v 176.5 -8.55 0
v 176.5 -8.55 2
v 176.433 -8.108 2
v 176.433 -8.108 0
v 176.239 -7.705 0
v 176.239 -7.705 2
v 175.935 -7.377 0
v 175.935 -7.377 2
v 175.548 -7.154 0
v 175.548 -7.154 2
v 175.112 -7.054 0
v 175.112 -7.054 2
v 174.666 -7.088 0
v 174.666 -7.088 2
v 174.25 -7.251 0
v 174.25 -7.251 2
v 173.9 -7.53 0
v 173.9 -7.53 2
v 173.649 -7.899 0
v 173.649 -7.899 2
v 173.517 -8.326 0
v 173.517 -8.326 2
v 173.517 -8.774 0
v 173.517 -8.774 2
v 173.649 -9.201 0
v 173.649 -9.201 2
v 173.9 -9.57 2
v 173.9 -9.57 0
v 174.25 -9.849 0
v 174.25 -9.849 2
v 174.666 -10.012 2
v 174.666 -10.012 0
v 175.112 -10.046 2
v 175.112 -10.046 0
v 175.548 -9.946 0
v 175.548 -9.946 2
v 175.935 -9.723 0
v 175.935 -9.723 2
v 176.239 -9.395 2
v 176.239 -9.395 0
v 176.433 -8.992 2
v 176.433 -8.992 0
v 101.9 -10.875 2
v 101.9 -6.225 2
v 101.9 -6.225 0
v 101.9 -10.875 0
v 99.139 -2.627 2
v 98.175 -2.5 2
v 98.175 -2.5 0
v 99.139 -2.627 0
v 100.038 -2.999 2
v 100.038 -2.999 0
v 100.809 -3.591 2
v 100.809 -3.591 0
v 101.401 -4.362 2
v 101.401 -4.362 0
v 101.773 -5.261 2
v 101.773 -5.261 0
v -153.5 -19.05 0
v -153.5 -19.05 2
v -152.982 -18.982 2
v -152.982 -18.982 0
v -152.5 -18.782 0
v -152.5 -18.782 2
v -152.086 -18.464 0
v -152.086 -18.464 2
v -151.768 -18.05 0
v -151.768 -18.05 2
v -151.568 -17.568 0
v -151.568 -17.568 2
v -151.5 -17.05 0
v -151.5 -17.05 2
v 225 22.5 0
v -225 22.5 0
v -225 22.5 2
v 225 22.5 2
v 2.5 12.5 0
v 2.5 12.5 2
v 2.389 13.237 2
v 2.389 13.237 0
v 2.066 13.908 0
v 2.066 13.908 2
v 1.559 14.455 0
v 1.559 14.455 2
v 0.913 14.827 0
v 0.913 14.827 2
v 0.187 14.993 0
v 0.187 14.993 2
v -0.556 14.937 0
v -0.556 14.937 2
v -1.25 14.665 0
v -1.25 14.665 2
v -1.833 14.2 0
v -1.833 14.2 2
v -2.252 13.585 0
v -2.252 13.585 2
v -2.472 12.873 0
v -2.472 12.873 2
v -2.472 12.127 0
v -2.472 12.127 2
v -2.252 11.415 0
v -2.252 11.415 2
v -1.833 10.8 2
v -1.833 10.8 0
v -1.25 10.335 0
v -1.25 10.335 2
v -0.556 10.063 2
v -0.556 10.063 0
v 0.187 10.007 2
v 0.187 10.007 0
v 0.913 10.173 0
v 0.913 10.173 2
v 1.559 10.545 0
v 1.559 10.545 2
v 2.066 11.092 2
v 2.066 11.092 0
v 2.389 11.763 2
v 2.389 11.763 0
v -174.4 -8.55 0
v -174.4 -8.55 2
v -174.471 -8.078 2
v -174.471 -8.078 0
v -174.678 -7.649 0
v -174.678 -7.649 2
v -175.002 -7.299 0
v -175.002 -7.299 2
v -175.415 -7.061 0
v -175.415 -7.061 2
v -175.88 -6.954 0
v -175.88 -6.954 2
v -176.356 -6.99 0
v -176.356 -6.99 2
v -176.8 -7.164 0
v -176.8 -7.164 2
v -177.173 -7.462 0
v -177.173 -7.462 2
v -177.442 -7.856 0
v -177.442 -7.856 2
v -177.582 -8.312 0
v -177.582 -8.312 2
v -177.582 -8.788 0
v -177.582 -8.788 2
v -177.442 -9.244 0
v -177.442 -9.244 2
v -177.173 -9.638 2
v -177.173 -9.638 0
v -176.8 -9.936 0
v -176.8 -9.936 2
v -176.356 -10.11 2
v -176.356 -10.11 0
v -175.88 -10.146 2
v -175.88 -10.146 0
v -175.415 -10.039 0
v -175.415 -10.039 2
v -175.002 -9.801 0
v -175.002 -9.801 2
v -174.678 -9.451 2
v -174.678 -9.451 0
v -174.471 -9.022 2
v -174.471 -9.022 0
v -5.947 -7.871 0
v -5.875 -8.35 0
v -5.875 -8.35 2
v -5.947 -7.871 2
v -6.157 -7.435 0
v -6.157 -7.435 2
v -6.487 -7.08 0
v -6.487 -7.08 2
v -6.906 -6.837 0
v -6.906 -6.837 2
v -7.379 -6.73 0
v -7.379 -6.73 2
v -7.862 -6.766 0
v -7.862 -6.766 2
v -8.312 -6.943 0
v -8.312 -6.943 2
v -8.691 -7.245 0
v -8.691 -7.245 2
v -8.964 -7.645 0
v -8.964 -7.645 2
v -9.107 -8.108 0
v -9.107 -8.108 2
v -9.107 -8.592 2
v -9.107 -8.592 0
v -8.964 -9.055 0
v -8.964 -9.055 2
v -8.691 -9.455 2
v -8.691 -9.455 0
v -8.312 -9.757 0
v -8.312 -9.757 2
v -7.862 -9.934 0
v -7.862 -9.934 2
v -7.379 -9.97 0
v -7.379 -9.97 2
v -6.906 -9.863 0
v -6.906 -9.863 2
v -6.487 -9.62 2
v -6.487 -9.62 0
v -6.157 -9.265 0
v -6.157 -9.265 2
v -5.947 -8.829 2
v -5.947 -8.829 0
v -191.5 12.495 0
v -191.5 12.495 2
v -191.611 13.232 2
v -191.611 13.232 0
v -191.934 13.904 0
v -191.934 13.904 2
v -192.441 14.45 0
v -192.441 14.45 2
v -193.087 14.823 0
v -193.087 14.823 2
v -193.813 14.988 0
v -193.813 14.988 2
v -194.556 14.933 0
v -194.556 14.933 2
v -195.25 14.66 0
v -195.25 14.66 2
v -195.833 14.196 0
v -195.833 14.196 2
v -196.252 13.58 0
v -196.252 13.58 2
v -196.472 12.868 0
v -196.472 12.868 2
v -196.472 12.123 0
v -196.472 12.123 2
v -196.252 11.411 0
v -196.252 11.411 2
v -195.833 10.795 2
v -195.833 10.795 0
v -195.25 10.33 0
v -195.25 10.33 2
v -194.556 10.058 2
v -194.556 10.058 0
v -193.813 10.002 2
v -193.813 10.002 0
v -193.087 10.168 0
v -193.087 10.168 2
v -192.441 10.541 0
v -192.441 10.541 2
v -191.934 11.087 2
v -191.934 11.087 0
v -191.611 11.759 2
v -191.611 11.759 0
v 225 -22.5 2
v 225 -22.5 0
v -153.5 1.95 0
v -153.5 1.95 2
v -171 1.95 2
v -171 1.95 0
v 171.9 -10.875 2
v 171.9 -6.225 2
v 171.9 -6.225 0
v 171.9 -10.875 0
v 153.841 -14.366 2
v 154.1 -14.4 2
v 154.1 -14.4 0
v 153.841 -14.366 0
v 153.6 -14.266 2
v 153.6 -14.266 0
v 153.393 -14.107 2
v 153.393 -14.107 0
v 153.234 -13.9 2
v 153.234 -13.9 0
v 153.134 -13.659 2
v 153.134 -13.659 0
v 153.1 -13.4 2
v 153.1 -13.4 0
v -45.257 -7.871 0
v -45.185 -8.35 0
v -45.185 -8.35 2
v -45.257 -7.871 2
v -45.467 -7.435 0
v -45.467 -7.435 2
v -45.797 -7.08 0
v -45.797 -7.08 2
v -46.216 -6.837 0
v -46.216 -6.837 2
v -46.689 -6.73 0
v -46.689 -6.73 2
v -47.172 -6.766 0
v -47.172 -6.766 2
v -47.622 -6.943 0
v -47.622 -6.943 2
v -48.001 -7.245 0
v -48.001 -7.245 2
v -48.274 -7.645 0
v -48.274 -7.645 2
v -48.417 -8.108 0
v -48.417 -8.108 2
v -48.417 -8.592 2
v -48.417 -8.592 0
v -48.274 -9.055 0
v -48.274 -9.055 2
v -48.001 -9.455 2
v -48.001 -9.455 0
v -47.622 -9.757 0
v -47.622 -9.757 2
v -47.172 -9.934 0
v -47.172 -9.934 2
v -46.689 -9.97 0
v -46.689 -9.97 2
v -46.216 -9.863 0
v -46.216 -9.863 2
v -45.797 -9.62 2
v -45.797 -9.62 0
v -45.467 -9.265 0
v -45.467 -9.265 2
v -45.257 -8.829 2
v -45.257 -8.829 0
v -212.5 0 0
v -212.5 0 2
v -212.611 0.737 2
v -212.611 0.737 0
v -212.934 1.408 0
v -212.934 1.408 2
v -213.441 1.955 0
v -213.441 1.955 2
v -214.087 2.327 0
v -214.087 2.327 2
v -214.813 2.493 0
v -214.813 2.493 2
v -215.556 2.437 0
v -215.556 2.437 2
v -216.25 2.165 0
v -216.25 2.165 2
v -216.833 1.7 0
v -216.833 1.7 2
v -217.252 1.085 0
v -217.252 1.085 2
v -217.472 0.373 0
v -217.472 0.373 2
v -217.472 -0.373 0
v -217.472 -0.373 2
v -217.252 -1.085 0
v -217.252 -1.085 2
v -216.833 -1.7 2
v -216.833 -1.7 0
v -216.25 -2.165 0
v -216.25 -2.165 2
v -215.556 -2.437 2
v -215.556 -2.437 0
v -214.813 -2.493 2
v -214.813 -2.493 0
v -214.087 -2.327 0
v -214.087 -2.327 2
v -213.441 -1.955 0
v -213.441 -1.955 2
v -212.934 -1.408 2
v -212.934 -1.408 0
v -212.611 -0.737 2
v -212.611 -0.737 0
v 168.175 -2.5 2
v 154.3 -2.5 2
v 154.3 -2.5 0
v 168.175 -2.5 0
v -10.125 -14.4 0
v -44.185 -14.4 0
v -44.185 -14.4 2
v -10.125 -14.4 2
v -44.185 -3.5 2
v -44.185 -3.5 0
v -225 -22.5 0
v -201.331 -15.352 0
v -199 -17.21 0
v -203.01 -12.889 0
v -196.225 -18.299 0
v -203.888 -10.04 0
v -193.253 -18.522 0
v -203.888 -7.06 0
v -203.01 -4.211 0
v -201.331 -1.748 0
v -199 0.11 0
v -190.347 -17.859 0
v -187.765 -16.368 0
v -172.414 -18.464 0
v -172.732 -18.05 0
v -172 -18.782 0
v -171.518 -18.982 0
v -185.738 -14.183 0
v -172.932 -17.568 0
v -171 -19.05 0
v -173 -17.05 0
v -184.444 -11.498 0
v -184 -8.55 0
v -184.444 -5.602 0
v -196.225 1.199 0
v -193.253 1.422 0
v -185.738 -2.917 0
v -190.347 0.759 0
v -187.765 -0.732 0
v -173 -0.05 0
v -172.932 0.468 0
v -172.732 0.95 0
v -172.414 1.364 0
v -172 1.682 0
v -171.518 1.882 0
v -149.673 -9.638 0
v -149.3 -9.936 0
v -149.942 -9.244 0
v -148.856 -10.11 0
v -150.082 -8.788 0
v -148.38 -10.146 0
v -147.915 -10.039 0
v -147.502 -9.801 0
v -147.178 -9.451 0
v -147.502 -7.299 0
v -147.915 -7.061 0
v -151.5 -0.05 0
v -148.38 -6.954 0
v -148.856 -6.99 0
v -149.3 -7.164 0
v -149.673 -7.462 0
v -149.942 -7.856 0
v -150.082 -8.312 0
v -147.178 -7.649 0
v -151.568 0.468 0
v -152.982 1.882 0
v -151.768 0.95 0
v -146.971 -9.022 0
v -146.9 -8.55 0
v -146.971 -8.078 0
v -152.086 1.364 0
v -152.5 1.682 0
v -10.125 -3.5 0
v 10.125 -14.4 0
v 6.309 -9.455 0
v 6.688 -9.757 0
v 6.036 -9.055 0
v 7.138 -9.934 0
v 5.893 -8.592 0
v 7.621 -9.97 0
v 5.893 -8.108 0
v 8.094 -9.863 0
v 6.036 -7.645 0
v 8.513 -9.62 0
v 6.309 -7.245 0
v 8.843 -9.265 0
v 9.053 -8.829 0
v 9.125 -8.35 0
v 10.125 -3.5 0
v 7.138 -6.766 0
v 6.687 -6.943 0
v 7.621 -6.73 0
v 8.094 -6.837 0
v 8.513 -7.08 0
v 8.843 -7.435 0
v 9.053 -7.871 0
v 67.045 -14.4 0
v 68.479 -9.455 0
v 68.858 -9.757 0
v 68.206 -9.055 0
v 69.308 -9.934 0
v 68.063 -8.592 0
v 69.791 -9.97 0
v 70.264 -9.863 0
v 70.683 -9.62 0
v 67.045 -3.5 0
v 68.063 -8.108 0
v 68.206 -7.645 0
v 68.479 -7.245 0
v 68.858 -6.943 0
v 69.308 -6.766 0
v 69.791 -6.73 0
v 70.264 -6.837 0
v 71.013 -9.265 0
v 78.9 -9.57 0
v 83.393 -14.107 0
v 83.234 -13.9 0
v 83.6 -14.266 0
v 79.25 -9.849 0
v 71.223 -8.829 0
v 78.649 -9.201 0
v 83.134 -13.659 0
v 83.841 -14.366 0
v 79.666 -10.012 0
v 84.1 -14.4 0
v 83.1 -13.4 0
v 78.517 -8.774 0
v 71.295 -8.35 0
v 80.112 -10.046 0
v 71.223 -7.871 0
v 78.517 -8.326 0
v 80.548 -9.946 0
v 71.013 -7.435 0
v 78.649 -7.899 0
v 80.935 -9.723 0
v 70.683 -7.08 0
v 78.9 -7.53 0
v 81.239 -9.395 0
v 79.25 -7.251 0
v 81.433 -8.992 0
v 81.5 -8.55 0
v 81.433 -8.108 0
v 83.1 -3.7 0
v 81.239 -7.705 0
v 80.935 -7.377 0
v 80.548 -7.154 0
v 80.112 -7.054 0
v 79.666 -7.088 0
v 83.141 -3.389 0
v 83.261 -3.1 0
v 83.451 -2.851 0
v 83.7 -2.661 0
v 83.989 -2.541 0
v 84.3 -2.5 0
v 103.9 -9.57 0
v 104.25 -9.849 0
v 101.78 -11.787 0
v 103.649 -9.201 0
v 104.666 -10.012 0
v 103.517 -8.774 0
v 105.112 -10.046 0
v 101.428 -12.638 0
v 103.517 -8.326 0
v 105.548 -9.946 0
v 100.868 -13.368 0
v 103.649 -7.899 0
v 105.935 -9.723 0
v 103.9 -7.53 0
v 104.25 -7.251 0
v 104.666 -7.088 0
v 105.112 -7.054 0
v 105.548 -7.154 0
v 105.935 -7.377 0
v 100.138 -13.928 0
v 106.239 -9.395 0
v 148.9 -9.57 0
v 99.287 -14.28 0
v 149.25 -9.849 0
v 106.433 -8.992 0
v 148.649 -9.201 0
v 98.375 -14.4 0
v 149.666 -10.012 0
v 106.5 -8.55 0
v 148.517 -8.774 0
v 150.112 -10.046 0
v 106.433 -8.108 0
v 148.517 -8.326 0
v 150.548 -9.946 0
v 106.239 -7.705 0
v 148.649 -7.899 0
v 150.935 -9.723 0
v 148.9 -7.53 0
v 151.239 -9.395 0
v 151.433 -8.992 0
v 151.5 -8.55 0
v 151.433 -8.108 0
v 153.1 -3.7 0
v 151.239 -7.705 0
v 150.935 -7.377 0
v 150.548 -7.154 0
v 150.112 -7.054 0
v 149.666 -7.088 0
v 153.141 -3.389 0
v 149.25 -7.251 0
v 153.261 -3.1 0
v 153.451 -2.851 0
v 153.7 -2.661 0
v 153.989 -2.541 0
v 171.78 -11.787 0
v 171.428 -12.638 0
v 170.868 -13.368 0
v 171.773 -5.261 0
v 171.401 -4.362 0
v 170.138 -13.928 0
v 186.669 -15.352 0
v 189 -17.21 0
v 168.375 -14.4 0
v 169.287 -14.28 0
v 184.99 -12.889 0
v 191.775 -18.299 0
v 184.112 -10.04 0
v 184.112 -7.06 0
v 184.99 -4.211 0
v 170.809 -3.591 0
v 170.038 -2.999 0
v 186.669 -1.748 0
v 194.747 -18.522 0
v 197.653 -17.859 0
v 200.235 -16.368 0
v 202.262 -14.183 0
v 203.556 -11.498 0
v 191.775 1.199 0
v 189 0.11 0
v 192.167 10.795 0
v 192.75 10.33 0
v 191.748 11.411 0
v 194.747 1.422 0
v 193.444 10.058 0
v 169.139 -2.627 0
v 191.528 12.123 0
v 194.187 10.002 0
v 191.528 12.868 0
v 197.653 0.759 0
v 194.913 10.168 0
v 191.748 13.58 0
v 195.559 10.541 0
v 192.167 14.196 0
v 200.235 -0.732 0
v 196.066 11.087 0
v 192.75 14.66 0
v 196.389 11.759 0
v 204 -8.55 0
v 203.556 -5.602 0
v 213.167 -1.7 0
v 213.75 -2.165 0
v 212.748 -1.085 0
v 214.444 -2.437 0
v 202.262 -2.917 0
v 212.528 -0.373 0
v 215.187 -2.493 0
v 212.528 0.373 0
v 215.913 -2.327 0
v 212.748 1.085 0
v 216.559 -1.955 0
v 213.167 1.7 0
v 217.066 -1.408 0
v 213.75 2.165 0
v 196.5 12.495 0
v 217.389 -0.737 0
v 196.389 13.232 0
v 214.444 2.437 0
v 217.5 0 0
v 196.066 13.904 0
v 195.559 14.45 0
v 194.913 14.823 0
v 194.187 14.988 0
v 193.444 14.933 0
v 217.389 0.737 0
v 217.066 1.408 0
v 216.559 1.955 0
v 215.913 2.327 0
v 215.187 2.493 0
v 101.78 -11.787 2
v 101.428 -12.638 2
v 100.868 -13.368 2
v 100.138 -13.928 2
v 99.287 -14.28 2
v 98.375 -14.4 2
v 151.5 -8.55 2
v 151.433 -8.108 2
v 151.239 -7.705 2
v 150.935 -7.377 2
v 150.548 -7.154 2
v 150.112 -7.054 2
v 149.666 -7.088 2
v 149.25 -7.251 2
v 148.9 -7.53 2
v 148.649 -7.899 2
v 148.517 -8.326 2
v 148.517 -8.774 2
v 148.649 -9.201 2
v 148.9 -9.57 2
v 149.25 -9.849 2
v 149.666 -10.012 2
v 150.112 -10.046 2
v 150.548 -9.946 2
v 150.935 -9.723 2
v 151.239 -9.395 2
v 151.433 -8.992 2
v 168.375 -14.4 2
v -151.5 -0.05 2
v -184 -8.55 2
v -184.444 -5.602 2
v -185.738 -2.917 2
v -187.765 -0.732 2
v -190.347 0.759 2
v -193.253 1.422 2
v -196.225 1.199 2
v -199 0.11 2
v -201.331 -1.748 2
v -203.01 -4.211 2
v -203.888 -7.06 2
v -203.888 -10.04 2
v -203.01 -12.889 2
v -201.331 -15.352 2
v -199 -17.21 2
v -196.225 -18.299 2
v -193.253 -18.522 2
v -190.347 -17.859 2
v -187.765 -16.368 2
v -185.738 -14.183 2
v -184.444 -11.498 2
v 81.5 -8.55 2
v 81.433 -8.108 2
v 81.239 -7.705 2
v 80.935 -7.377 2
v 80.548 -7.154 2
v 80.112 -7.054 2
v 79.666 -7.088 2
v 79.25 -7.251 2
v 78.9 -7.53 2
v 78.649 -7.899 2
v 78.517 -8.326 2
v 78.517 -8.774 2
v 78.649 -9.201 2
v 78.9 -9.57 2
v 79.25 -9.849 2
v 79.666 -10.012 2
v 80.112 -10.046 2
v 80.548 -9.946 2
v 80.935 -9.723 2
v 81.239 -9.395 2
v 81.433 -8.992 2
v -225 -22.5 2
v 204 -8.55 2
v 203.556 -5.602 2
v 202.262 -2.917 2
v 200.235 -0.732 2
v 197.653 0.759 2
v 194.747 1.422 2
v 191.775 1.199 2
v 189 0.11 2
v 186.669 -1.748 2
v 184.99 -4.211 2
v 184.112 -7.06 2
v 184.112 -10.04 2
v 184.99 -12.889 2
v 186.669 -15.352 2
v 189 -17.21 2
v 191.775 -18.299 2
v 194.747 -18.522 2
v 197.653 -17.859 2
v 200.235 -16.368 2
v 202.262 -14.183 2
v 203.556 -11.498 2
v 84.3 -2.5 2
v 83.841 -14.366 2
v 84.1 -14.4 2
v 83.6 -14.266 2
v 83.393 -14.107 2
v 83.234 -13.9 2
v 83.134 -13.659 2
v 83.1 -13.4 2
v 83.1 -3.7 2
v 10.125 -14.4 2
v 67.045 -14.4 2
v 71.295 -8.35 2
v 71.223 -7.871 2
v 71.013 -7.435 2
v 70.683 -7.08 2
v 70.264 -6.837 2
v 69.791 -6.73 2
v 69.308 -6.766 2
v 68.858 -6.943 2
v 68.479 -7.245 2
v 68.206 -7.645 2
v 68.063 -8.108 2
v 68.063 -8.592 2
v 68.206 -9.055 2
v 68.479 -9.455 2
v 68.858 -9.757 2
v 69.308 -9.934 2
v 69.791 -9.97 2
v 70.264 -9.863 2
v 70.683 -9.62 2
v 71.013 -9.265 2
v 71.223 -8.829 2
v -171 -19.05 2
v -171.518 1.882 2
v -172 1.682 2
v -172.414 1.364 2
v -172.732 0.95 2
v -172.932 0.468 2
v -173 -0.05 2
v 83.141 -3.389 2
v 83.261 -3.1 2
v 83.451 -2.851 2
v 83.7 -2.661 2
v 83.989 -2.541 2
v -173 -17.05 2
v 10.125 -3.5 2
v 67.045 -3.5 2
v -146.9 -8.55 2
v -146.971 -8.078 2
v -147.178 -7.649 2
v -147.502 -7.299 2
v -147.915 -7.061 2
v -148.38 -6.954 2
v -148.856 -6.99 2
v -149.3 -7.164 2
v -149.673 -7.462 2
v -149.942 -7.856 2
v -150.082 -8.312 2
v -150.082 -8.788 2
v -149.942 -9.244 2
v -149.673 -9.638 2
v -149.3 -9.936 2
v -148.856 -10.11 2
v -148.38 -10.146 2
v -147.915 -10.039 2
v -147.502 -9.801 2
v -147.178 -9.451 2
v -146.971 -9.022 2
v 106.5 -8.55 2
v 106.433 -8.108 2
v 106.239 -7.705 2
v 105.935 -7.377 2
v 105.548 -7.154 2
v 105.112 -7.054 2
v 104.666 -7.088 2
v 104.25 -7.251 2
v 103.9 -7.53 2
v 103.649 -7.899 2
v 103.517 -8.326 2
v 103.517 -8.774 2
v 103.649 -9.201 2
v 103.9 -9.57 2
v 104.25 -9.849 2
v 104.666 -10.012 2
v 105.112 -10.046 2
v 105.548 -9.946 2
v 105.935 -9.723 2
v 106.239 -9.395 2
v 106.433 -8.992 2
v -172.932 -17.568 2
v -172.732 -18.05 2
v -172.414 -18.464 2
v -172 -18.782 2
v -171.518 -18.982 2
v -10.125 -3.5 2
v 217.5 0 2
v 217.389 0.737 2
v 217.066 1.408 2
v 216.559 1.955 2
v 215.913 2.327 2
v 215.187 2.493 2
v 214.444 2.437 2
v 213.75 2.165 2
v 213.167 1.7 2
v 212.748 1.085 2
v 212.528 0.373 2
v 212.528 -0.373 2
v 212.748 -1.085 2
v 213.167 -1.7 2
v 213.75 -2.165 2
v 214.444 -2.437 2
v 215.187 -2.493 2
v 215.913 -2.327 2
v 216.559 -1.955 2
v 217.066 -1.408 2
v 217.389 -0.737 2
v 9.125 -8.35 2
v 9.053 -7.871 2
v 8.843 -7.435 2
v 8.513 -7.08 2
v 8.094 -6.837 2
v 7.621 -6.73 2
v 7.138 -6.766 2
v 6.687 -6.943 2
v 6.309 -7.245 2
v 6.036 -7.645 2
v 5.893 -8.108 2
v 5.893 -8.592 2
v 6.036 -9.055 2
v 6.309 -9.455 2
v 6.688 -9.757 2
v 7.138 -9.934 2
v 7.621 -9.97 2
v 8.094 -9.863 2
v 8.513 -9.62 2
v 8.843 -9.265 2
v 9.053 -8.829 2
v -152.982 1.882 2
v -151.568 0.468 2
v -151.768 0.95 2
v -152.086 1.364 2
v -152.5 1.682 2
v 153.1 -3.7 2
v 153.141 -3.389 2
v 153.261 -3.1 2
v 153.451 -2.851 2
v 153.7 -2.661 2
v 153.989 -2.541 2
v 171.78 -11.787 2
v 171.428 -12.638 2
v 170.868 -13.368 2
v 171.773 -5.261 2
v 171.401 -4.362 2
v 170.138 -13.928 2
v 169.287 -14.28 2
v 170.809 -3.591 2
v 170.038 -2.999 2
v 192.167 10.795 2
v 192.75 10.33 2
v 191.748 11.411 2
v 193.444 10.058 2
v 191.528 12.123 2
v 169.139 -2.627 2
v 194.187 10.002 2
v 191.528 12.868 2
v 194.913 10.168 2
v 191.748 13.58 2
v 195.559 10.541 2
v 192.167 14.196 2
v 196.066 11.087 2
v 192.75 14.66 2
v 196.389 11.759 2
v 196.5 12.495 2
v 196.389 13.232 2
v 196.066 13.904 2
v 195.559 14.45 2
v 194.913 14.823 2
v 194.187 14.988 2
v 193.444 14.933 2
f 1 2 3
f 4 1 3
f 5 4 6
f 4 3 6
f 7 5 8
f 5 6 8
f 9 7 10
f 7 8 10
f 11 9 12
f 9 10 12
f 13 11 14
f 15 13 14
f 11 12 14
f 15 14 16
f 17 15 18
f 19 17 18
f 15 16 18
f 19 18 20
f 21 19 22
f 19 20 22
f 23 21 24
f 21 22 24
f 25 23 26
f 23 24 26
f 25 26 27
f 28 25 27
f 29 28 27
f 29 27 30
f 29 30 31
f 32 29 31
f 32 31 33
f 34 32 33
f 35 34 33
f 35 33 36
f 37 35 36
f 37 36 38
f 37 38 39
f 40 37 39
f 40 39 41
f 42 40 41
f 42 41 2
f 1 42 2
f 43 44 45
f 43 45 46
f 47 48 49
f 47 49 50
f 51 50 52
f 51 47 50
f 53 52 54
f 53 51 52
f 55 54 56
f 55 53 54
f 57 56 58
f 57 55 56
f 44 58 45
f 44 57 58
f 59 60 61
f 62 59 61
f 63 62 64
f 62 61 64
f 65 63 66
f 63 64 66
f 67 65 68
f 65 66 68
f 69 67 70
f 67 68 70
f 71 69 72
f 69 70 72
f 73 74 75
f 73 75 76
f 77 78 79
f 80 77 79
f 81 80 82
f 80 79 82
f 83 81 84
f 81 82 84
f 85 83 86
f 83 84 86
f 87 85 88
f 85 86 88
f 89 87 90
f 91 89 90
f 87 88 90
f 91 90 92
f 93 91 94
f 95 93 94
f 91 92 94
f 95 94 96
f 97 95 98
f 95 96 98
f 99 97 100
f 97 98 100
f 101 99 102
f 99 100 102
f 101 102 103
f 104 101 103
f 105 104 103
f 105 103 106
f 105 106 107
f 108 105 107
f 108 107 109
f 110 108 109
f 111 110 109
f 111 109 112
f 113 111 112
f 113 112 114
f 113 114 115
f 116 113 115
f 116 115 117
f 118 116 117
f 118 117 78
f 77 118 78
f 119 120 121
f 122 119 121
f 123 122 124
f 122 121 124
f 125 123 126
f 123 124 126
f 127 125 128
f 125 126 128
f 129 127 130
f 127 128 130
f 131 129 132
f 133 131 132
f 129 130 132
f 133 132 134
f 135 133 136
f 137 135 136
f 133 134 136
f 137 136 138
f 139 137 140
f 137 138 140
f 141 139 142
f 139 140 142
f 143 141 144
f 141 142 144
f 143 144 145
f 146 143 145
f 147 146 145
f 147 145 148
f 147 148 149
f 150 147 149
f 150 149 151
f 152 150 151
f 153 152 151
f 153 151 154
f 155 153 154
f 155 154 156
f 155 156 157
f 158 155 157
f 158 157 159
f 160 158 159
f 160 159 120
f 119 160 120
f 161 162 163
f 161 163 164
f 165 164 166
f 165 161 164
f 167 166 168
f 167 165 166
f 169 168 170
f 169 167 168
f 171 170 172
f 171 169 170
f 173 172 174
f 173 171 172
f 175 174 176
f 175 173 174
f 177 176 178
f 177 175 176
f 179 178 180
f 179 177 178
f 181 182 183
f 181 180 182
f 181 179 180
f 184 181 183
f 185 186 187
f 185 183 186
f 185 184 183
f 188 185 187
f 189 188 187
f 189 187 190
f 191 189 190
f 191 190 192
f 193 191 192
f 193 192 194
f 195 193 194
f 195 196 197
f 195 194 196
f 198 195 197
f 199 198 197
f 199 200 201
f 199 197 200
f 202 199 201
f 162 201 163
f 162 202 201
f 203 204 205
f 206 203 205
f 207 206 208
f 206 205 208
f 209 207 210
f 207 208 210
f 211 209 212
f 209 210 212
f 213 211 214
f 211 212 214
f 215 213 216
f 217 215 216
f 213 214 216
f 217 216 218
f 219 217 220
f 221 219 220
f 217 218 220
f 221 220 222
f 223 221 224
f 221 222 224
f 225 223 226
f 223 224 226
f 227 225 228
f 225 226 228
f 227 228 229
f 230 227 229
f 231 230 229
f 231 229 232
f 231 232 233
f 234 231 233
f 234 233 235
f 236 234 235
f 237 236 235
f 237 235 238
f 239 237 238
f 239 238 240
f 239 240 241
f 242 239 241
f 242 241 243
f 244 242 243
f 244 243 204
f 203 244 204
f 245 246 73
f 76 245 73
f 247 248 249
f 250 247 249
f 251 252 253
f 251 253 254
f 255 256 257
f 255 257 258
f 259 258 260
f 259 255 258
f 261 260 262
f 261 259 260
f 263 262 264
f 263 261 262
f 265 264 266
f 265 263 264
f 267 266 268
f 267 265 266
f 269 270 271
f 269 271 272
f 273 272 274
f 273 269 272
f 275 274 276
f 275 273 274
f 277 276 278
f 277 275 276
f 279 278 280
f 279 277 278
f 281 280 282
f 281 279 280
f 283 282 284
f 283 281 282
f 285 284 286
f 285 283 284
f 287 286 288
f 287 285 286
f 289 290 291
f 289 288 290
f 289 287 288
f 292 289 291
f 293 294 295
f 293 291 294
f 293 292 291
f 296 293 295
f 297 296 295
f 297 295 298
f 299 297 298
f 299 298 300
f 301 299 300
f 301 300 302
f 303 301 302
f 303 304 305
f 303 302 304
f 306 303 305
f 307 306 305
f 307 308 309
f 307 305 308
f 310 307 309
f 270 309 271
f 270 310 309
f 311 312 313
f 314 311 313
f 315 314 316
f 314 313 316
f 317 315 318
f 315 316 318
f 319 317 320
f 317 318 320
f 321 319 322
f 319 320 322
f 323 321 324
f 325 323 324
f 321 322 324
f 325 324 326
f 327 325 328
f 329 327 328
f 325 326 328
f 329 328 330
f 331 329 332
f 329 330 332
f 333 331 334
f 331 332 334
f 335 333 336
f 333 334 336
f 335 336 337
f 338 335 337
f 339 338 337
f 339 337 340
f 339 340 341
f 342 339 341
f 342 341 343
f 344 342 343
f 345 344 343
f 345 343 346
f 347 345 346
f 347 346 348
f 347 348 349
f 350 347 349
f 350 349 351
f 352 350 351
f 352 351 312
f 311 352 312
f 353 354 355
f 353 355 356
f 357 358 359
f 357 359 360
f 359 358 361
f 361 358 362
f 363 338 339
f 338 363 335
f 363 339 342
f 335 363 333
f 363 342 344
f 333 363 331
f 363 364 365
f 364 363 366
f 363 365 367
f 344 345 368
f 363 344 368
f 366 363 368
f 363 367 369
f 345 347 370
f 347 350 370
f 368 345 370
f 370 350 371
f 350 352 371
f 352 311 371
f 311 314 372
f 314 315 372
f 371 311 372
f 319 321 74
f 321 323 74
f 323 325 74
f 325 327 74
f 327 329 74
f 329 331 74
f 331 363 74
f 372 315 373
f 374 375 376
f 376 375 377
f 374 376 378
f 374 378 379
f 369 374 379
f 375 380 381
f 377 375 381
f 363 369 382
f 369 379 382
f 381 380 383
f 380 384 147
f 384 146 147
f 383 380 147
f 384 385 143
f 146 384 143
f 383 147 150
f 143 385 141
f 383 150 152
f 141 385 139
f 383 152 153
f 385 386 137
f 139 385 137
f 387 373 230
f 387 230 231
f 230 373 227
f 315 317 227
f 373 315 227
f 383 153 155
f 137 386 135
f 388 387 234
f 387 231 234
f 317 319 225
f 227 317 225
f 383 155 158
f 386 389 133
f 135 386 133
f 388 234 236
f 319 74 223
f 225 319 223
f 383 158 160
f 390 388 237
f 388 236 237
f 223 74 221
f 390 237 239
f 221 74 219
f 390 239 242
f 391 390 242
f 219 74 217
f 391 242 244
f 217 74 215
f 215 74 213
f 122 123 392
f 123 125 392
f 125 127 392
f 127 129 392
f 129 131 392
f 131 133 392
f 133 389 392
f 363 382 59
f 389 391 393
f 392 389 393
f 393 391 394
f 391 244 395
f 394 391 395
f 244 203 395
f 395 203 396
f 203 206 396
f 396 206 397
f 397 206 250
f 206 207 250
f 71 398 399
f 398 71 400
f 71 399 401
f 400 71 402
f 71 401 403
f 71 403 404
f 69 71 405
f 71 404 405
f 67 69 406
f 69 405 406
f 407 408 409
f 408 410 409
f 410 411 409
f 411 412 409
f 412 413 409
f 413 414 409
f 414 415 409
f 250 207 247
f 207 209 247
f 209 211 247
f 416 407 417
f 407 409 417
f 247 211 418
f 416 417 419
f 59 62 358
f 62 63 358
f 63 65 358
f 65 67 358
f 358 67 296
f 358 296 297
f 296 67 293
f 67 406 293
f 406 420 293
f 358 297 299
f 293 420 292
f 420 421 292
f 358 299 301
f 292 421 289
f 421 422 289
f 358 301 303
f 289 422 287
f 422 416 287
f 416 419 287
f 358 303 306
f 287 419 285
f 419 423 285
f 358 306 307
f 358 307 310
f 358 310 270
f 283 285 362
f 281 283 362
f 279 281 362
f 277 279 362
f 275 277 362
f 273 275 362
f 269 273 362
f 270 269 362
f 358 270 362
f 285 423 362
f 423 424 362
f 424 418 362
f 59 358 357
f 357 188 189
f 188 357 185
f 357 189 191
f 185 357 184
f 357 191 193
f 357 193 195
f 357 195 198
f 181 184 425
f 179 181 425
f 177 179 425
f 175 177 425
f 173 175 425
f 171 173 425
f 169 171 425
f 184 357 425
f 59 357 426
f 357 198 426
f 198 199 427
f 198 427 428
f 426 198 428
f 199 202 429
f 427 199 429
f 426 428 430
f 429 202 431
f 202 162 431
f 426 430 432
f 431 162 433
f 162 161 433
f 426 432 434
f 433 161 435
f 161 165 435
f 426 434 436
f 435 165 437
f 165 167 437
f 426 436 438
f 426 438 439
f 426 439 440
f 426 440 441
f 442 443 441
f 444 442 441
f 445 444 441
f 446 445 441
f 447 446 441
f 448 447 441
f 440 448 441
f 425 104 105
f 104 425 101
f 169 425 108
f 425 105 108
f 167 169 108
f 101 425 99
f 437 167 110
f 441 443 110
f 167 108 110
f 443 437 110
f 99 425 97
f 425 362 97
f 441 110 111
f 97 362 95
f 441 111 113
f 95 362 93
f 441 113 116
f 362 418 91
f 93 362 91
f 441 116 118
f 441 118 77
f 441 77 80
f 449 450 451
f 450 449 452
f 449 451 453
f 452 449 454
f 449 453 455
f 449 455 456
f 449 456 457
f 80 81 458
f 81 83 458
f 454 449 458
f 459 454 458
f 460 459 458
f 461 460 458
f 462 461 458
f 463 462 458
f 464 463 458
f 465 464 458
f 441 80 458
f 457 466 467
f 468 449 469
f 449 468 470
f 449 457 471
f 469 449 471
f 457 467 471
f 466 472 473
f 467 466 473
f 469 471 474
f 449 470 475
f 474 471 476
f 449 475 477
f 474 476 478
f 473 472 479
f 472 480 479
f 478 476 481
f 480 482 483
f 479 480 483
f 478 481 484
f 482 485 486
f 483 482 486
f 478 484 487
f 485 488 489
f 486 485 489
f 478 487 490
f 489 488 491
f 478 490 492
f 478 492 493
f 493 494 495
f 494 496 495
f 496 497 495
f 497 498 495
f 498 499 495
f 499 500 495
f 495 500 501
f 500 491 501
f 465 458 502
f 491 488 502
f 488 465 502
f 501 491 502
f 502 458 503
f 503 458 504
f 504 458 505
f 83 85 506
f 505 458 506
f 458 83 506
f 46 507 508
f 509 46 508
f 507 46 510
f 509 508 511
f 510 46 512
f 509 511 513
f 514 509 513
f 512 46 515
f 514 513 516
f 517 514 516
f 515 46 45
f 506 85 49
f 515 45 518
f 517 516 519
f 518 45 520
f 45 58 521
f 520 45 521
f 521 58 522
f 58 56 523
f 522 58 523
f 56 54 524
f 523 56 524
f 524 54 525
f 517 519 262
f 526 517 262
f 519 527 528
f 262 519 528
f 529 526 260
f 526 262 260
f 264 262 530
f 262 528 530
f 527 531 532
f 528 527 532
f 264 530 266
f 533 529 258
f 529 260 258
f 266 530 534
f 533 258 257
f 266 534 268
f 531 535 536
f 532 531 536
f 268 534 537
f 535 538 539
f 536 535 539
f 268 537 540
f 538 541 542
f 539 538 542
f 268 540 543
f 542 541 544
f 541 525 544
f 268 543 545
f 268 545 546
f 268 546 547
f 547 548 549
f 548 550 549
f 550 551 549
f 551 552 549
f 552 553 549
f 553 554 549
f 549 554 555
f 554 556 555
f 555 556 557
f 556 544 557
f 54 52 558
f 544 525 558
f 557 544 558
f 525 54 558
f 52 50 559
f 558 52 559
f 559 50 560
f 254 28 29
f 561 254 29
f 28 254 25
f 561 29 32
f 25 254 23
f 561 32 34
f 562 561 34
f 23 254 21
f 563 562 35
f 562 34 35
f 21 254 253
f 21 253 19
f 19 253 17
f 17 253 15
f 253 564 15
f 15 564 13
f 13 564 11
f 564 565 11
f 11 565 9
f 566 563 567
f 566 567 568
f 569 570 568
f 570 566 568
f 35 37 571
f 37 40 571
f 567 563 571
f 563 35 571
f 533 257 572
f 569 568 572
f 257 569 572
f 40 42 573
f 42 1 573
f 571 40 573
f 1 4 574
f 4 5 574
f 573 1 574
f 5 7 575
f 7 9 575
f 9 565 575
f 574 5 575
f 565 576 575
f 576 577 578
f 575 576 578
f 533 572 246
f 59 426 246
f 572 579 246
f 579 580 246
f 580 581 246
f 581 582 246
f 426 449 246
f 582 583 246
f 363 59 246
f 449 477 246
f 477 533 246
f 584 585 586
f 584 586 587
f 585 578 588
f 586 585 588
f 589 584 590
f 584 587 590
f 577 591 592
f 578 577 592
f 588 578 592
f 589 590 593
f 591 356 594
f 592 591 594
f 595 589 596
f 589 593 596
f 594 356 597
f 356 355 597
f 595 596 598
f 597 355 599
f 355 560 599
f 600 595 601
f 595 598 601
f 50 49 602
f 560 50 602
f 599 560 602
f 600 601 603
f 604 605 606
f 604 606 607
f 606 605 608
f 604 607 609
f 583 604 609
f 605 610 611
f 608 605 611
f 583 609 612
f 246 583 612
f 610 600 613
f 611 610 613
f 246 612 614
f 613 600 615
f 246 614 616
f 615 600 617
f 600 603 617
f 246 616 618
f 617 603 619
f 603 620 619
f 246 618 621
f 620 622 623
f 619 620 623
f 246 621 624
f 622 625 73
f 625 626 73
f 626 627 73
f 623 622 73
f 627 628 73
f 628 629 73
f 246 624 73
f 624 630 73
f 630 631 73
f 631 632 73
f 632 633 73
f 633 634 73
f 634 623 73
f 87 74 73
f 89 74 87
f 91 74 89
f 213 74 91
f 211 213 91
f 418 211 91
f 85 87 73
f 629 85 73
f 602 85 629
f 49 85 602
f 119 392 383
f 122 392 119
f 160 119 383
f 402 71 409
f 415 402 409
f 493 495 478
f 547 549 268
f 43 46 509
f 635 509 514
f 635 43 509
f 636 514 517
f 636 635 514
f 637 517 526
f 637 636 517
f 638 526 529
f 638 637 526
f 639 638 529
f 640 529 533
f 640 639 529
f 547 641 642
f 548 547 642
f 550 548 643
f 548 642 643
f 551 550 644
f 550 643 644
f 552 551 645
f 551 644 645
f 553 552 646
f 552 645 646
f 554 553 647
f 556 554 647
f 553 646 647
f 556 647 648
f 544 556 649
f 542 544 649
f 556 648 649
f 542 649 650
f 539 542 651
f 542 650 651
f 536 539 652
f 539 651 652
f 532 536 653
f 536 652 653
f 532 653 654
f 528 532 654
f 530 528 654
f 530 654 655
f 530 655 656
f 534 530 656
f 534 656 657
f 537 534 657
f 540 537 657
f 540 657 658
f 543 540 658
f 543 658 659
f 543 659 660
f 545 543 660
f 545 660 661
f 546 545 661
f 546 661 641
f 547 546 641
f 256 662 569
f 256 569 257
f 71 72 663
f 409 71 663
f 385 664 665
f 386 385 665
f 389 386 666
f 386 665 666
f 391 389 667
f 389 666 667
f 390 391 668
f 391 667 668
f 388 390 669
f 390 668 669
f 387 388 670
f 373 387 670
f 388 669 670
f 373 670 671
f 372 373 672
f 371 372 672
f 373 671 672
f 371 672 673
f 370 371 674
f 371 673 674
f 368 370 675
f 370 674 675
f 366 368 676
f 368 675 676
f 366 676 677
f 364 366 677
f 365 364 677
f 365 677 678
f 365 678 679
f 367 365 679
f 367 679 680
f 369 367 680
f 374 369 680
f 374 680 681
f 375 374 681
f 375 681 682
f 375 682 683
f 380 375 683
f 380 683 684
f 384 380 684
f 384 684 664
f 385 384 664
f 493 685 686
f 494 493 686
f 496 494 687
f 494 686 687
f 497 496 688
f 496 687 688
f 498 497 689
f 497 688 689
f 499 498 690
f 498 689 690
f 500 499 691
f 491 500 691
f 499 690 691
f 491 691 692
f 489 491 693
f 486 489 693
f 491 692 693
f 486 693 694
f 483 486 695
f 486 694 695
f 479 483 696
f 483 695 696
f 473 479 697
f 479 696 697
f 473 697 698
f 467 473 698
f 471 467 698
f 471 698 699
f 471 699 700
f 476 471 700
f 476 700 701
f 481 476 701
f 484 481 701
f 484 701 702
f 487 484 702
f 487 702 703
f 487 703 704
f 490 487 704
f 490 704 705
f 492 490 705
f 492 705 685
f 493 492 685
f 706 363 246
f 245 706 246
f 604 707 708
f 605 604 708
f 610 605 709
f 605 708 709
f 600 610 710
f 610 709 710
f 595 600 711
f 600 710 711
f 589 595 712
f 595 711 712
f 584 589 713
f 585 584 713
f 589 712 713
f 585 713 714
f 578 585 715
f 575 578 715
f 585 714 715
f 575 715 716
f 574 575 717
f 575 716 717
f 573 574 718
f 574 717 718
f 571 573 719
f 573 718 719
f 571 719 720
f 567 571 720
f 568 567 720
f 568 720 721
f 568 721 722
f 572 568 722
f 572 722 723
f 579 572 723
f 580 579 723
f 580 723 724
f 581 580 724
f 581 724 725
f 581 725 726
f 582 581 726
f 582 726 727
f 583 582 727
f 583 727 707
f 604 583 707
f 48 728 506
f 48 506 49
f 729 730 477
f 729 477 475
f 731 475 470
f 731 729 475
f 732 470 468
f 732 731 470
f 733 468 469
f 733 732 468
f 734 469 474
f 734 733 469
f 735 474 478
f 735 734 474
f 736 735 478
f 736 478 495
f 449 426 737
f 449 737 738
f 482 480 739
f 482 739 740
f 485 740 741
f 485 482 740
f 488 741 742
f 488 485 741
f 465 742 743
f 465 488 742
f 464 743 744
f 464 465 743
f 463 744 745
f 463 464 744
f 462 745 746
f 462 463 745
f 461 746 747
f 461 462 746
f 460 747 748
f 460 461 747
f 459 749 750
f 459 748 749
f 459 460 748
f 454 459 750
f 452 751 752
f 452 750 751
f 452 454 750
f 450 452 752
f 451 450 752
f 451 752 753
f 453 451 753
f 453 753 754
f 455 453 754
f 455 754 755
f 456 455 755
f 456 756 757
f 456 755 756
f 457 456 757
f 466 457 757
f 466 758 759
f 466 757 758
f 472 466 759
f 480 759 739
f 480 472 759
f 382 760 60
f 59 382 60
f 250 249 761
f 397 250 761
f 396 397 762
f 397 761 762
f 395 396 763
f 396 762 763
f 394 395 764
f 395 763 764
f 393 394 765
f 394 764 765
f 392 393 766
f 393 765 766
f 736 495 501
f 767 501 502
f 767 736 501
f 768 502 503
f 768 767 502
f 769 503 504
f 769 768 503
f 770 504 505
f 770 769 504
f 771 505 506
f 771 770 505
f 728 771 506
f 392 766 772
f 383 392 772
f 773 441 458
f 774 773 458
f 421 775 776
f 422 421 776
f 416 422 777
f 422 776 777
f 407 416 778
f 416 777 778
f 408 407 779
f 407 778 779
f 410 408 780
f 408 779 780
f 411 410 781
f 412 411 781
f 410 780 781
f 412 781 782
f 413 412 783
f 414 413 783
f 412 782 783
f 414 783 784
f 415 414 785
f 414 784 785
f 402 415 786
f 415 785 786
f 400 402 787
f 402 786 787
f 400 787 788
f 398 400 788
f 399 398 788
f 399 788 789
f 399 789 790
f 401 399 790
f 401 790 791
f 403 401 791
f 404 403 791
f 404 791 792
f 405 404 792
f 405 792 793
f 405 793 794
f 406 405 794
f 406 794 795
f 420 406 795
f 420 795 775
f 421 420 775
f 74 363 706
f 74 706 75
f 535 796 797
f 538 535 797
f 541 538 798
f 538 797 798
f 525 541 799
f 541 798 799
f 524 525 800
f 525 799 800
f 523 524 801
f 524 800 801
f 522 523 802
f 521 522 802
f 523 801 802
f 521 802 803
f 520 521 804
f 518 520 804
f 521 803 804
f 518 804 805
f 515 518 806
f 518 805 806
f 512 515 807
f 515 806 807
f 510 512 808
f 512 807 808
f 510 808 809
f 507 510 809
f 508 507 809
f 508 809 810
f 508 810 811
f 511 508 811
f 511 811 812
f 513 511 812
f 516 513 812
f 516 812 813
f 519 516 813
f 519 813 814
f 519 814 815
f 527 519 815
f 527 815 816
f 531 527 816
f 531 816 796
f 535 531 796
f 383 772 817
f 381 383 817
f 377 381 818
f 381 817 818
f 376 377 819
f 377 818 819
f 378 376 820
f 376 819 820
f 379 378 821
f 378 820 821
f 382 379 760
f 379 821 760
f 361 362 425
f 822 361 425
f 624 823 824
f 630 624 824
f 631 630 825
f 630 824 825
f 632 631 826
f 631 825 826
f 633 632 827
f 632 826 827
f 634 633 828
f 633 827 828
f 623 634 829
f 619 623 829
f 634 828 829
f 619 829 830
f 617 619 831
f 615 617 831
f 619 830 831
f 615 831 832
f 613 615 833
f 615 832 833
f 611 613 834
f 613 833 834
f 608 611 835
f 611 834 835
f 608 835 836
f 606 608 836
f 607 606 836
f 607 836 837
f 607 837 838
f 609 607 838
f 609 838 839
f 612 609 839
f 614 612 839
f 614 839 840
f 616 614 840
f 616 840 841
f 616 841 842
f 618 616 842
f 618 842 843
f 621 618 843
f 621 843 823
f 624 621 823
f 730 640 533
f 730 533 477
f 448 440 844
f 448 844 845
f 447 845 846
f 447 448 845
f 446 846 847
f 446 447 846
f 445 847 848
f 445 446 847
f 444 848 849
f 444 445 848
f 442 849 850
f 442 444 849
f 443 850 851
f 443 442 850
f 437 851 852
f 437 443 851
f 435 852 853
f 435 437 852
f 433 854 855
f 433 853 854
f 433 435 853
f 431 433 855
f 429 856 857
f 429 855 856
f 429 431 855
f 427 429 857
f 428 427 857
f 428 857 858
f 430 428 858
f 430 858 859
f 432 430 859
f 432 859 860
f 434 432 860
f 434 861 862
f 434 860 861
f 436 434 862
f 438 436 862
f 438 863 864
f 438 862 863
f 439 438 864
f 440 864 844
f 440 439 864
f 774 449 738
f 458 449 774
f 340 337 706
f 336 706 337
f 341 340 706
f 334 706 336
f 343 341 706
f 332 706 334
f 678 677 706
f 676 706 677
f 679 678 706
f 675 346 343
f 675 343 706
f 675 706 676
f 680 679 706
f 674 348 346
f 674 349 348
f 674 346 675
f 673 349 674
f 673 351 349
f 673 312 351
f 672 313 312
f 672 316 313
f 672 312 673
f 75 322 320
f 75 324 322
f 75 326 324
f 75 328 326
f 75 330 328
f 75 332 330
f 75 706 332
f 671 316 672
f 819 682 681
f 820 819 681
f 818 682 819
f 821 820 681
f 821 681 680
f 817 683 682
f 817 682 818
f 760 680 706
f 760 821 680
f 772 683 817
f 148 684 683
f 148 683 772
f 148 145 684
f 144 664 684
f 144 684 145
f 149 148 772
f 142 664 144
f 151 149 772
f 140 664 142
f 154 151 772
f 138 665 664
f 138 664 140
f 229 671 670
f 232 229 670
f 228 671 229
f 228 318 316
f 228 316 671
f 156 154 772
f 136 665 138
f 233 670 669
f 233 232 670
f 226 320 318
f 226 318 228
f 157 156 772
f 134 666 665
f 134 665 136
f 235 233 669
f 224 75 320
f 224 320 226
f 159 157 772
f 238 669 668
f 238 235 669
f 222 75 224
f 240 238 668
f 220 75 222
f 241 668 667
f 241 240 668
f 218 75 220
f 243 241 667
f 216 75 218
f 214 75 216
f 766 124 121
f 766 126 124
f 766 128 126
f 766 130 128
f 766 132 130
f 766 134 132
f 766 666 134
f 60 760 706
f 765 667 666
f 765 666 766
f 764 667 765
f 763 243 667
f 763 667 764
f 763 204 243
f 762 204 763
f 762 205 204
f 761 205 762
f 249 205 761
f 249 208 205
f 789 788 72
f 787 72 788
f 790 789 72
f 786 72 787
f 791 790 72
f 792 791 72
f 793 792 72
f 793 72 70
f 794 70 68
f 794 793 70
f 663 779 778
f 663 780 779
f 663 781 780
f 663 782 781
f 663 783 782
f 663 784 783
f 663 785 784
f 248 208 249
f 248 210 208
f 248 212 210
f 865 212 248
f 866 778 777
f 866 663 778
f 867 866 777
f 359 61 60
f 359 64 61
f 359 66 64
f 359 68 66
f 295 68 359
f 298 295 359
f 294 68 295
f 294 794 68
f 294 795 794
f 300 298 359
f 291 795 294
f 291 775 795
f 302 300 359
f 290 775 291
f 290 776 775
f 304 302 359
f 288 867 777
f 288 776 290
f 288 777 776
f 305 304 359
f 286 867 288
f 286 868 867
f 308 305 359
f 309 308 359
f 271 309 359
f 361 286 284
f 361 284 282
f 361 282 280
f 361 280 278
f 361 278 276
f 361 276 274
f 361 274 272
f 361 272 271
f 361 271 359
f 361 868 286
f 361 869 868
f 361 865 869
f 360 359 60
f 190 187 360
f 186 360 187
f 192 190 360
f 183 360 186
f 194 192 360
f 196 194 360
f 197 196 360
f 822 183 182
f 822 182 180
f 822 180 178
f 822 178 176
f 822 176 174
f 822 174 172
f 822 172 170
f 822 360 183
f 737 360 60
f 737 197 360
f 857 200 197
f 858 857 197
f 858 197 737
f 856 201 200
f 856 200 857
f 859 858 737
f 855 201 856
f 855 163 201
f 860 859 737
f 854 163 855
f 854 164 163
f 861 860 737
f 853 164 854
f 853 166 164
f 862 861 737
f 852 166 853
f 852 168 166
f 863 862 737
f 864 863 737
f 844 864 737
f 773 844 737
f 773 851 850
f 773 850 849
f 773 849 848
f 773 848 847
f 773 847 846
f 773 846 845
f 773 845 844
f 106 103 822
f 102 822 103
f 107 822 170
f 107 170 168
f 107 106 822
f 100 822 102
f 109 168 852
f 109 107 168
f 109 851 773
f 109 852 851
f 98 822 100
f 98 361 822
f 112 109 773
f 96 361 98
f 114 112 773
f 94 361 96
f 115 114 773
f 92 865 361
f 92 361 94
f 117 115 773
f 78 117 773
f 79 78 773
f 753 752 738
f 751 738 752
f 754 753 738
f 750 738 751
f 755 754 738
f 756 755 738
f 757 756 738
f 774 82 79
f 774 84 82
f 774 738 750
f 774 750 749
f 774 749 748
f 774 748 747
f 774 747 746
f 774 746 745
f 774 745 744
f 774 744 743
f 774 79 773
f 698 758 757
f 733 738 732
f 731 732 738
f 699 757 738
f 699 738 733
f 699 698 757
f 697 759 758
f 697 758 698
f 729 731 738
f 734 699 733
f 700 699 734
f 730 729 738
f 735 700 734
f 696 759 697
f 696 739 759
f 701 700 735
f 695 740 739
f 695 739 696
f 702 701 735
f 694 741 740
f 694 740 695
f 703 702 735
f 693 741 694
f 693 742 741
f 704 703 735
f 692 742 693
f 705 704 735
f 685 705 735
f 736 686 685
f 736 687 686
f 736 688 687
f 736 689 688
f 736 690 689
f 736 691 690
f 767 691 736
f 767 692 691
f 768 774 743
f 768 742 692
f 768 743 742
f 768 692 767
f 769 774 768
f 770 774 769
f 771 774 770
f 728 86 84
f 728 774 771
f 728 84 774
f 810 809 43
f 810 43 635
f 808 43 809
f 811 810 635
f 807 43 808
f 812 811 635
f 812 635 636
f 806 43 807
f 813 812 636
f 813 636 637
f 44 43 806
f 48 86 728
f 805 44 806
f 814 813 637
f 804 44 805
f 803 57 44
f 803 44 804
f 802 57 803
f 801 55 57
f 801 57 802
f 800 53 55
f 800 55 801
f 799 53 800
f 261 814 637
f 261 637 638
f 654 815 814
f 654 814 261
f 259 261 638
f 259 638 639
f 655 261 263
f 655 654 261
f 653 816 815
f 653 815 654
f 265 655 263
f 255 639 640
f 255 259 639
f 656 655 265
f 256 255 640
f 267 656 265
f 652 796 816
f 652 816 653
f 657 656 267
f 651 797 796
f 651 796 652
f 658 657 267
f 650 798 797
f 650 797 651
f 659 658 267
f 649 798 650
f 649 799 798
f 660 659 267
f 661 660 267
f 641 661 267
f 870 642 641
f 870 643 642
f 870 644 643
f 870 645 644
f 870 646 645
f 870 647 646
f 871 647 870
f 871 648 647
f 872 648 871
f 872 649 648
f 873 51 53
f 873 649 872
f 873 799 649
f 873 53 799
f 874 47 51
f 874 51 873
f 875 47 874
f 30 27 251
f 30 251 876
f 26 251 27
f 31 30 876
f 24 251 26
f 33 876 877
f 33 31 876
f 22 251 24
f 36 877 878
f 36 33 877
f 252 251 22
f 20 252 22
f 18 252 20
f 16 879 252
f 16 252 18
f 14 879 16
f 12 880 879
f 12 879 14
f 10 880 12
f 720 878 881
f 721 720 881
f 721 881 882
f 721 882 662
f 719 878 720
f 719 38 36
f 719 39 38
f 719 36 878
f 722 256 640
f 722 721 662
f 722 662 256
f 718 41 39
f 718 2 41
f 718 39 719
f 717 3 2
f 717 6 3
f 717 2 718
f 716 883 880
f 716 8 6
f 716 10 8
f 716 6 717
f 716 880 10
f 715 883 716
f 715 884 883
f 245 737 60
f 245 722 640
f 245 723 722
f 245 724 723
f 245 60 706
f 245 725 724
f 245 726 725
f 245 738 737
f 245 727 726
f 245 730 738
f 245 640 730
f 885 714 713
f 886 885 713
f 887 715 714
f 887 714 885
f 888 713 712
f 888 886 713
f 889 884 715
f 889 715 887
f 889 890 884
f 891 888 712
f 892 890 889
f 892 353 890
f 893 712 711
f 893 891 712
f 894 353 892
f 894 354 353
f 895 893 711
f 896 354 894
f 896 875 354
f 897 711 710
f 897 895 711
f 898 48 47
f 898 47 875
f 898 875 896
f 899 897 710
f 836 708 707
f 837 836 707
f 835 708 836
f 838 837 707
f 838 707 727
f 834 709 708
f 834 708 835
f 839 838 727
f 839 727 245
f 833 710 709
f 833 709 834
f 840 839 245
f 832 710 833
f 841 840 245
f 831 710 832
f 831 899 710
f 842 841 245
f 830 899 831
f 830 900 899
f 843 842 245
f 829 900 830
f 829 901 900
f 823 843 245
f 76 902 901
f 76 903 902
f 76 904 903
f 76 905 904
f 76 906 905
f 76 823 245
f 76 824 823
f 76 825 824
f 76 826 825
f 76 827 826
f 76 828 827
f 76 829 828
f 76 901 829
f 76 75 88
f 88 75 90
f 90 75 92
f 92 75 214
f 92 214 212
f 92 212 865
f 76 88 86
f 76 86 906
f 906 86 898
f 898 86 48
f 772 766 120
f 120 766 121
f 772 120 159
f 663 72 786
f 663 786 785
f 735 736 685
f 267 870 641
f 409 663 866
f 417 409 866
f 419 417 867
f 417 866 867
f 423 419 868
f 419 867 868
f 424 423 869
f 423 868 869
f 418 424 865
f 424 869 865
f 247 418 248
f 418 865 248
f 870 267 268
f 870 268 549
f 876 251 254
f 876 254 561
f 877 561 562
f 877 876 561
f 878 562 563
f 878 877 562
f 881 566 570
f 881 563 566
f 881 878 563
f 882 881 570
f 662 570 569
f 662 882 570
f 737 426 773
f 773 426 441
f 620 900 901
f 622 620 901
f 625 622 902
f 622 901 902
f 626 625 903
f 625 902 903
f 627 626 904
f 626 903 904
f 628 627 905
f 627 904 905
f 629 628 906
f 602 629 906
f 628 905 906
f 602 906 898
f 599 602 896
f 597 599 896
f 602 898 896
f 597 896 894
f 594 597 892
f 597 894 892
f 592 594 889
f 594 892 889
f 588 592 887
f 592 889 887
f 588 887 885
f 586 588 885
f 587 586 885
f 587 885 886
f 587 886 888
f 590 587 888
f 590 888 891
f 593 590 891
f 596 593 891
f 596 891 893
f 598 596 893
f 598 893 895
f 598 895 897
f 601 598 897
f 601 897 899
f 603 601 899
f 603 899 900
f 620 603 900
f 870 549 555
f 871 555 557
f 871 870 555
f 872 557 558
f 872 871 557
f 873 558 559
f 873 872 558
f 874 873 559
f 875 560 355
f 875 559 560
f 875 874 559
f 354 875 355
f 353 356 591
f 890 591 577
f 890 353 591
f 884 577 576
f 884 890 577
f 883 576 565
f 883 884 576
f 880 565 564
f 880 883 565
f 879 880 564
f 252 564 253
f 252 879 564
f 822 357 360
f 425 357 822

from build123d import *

# Parameters (mm, degrees)
SKETCH1_W                      = 450
SKETCH1_H                      = 45
BOSS_EXTRUDE1_DEPTH            = 2
TERMINAL_12P_CUTOUT_DEPTH      = 227.131046077
TERMINAL_12P_CUTOUT_DEPTH_BACK = 227.131046077
SK_TERMINAL_12P_CUTOUT_R       = 1.625
SK_TERMINAL_12P_CUTOUT_W       = 56.92
SK_TERMINAL_12P_CUTOUT_H       = 10.9
SK_TERMINAL_12P_CUTOUT_W_2     = 34.06
SKETCH2_R                      = 2.5
CUT_EXTRUDE1_DEPTH             = 227.131046077
SKETCH3_R                      = 1.5
SKETCH3_R_2                    = 10
SKETCH3_R_3                    = 1.6
CUT_EXTRUDE2_DEPTH             = 10


with BuildPart() as part:
    # Sketch1 → Boss-Extrude1 (new body)
    with BuildSketch(Plane.XY):
        Rectangle(SKETCH1_W, SKETCH1_H)
    extrude(amount=BOSS_EXTRUDE1_DEPTH)

    # SK Terminal 12P cutout → Terminal 12P cutout (cut, two sides: drawn at the far end of the back side and taken through both)
    with BuildSketch(Plane.XY.offset(-TERMINAL_12P_CUTOUT_DEPTH_BACK)):
        with Locations((7.5, -8.35)):
            Circle(SK_TERMINAL_12P_CUTOUT_R)
        with Locations((69.67, -8.35)):
            Circle(SK_TERMINAL_12P_CUTOUT_R)
        with Locations((-46.81, -8.35)):
            Circle(SK_TERMINAL_12P_CUTOUT_R)
        with Locations((-7.5, -8.35)):
            Circle(SK_TERMINAL_12P_CUTOUT_R)
        with Locations((38.585, -8.95)):
            Rectangle(SK_TERMINAL_12P_CUTOUT_W, SK_TERMINAL_12P_CUTOUT_H)
        with Locations((-27.155, -8.95)):
            Rectangle(SK_TERMINAL_12P_CUTOUT_W_2, SK_TERMINAL_12P_CUTOUT_H)
    extrude(amount=TERMINAL_12P_CUTOUT_DEPTH + TERMINAL_12P_CUTOUT_DEPTH_BACK, mode=Mode.SUBTRACT)

    # Sketch2 → Cut-Extrude1 (cut, through all)
    with BuildSketch(Plane.XY.offset(2)):
        with Locations((-215, 0)):
            Circle(SKETCH2_R)
        with Locations((215, 0)):
            Circle(SKETCH2_R)
        with Locations((-194, 12.495407459)):
            Circle(SKETCH2_R)
        with Locations((194, 12.495407459)):
            Circle(SKETCH2_R)
        with Locations((0, 12.5)):
            Circle(SKETCH2_R)
    extrude(amount=-CUT_EXTRUDE1_DEPTH, mode=Mode.SUBTRACT)

    # Sketch3 → Cut-Extrude2 (cut)
    with BuildSketch(Plane.XY.offset(2)):
        with Locations((150, -8.55)):
            Circle(SKETCH3_R)
        with Locations((175, -8.55)):
            Circle(SKETCH3_R)
        with Locations((80, -8.55)):
            Circle(SKETCH3_R)
        with Locations((105, -8.55)):
            Circle(SKETCH3_R)
        with Locations((194, -8.55)):
            Circle(SKETCH3_R_2)
        with Locations((-194, -8.55)):
            Circle(SKETCH3_R_2)
        with Locations((-176, -8.55)):
            Circle(SKETCH3_R_3)
        with Locations((-148.5, -8.55)):
            Circle(SKETCH3_R_3)
        with BuildLine():
            Line((168.375, -14.4), (154.1, -14.4))
            ThreePointArc((154.1, -14.4), (153.392893219, -14.107106781), (153.1, -13.4))
            Line((153.1, -13.4), (153.1, -3.7))
            ThreePointArc((153.1, -3.7), (153.451471863, -2.851471863), (154.3, -2.5))
            Line((154.3, -2.5), (168.175, -2.5))
            ThreePointArc((168.175, -2.5), (170.80897276, -3.59102724), (171.9, -6.225))
            Line((171.9, -6.225), (171.9, -10.875))
            ThreePointArc((171.9, -10.875), (170.867551404, -13.367551404), (168.375, -14.4))
        make_face()
        with BuildLine():
            Line((98.375, -14.4), (84.1, -14.4))
            ThreePointArc((84.1, -14.4), (83.392893219, -14.107106781), (83.1, -13.4))
            Line((83.1, -13.4), (83.1, -3.7))
            ThreePointArc((83.1, -3.7), (83.451471863, -2.851471863), (84.3, -2.5))
            Line((84.3, -2.5), (98.175, -2.5))
            ThreePointArc((98.175, -2.5), (100.80897276, -3.59102724), (101.9, -6.225))
            Line((101.9, -6.225), (101.9, -10.875))
            ThreePointArc((101.9, -10.875), (100.867551404, -13.367551404), (98.375, -14.4))
        make_face()
        with BuildLine():
            Line((-171, -19.05), (-153.5, -19.05))
            ThreePointArc((-153.5, -19.05), (-152.085786438, -18.464213562), (-151.5, -17.05))
            Line((-151.5, -17.05), (-151.5, -0.05))
            ThreePointArc((-151.5, -0.05), (-152.085786438, 1.364213562), (-153.5, 1.95))
            Line((-153.5, 1.95), (-171, 1.95))
            ThreePointArc((-171, 1.95), (-172.414213562, 1.364213562), (-173, -0.05))
            Line((-173, -0.05), (-173, -17.05))
            ThreePointArc((-173, -17.05), (-172.414213562, -18.464213562), (-171, -19.05))
        make_face()
    extrude(amount=-CUT_EXTRUDE2_DEPTH, mode=Mode.SUBTRACT)


solid = part.part
